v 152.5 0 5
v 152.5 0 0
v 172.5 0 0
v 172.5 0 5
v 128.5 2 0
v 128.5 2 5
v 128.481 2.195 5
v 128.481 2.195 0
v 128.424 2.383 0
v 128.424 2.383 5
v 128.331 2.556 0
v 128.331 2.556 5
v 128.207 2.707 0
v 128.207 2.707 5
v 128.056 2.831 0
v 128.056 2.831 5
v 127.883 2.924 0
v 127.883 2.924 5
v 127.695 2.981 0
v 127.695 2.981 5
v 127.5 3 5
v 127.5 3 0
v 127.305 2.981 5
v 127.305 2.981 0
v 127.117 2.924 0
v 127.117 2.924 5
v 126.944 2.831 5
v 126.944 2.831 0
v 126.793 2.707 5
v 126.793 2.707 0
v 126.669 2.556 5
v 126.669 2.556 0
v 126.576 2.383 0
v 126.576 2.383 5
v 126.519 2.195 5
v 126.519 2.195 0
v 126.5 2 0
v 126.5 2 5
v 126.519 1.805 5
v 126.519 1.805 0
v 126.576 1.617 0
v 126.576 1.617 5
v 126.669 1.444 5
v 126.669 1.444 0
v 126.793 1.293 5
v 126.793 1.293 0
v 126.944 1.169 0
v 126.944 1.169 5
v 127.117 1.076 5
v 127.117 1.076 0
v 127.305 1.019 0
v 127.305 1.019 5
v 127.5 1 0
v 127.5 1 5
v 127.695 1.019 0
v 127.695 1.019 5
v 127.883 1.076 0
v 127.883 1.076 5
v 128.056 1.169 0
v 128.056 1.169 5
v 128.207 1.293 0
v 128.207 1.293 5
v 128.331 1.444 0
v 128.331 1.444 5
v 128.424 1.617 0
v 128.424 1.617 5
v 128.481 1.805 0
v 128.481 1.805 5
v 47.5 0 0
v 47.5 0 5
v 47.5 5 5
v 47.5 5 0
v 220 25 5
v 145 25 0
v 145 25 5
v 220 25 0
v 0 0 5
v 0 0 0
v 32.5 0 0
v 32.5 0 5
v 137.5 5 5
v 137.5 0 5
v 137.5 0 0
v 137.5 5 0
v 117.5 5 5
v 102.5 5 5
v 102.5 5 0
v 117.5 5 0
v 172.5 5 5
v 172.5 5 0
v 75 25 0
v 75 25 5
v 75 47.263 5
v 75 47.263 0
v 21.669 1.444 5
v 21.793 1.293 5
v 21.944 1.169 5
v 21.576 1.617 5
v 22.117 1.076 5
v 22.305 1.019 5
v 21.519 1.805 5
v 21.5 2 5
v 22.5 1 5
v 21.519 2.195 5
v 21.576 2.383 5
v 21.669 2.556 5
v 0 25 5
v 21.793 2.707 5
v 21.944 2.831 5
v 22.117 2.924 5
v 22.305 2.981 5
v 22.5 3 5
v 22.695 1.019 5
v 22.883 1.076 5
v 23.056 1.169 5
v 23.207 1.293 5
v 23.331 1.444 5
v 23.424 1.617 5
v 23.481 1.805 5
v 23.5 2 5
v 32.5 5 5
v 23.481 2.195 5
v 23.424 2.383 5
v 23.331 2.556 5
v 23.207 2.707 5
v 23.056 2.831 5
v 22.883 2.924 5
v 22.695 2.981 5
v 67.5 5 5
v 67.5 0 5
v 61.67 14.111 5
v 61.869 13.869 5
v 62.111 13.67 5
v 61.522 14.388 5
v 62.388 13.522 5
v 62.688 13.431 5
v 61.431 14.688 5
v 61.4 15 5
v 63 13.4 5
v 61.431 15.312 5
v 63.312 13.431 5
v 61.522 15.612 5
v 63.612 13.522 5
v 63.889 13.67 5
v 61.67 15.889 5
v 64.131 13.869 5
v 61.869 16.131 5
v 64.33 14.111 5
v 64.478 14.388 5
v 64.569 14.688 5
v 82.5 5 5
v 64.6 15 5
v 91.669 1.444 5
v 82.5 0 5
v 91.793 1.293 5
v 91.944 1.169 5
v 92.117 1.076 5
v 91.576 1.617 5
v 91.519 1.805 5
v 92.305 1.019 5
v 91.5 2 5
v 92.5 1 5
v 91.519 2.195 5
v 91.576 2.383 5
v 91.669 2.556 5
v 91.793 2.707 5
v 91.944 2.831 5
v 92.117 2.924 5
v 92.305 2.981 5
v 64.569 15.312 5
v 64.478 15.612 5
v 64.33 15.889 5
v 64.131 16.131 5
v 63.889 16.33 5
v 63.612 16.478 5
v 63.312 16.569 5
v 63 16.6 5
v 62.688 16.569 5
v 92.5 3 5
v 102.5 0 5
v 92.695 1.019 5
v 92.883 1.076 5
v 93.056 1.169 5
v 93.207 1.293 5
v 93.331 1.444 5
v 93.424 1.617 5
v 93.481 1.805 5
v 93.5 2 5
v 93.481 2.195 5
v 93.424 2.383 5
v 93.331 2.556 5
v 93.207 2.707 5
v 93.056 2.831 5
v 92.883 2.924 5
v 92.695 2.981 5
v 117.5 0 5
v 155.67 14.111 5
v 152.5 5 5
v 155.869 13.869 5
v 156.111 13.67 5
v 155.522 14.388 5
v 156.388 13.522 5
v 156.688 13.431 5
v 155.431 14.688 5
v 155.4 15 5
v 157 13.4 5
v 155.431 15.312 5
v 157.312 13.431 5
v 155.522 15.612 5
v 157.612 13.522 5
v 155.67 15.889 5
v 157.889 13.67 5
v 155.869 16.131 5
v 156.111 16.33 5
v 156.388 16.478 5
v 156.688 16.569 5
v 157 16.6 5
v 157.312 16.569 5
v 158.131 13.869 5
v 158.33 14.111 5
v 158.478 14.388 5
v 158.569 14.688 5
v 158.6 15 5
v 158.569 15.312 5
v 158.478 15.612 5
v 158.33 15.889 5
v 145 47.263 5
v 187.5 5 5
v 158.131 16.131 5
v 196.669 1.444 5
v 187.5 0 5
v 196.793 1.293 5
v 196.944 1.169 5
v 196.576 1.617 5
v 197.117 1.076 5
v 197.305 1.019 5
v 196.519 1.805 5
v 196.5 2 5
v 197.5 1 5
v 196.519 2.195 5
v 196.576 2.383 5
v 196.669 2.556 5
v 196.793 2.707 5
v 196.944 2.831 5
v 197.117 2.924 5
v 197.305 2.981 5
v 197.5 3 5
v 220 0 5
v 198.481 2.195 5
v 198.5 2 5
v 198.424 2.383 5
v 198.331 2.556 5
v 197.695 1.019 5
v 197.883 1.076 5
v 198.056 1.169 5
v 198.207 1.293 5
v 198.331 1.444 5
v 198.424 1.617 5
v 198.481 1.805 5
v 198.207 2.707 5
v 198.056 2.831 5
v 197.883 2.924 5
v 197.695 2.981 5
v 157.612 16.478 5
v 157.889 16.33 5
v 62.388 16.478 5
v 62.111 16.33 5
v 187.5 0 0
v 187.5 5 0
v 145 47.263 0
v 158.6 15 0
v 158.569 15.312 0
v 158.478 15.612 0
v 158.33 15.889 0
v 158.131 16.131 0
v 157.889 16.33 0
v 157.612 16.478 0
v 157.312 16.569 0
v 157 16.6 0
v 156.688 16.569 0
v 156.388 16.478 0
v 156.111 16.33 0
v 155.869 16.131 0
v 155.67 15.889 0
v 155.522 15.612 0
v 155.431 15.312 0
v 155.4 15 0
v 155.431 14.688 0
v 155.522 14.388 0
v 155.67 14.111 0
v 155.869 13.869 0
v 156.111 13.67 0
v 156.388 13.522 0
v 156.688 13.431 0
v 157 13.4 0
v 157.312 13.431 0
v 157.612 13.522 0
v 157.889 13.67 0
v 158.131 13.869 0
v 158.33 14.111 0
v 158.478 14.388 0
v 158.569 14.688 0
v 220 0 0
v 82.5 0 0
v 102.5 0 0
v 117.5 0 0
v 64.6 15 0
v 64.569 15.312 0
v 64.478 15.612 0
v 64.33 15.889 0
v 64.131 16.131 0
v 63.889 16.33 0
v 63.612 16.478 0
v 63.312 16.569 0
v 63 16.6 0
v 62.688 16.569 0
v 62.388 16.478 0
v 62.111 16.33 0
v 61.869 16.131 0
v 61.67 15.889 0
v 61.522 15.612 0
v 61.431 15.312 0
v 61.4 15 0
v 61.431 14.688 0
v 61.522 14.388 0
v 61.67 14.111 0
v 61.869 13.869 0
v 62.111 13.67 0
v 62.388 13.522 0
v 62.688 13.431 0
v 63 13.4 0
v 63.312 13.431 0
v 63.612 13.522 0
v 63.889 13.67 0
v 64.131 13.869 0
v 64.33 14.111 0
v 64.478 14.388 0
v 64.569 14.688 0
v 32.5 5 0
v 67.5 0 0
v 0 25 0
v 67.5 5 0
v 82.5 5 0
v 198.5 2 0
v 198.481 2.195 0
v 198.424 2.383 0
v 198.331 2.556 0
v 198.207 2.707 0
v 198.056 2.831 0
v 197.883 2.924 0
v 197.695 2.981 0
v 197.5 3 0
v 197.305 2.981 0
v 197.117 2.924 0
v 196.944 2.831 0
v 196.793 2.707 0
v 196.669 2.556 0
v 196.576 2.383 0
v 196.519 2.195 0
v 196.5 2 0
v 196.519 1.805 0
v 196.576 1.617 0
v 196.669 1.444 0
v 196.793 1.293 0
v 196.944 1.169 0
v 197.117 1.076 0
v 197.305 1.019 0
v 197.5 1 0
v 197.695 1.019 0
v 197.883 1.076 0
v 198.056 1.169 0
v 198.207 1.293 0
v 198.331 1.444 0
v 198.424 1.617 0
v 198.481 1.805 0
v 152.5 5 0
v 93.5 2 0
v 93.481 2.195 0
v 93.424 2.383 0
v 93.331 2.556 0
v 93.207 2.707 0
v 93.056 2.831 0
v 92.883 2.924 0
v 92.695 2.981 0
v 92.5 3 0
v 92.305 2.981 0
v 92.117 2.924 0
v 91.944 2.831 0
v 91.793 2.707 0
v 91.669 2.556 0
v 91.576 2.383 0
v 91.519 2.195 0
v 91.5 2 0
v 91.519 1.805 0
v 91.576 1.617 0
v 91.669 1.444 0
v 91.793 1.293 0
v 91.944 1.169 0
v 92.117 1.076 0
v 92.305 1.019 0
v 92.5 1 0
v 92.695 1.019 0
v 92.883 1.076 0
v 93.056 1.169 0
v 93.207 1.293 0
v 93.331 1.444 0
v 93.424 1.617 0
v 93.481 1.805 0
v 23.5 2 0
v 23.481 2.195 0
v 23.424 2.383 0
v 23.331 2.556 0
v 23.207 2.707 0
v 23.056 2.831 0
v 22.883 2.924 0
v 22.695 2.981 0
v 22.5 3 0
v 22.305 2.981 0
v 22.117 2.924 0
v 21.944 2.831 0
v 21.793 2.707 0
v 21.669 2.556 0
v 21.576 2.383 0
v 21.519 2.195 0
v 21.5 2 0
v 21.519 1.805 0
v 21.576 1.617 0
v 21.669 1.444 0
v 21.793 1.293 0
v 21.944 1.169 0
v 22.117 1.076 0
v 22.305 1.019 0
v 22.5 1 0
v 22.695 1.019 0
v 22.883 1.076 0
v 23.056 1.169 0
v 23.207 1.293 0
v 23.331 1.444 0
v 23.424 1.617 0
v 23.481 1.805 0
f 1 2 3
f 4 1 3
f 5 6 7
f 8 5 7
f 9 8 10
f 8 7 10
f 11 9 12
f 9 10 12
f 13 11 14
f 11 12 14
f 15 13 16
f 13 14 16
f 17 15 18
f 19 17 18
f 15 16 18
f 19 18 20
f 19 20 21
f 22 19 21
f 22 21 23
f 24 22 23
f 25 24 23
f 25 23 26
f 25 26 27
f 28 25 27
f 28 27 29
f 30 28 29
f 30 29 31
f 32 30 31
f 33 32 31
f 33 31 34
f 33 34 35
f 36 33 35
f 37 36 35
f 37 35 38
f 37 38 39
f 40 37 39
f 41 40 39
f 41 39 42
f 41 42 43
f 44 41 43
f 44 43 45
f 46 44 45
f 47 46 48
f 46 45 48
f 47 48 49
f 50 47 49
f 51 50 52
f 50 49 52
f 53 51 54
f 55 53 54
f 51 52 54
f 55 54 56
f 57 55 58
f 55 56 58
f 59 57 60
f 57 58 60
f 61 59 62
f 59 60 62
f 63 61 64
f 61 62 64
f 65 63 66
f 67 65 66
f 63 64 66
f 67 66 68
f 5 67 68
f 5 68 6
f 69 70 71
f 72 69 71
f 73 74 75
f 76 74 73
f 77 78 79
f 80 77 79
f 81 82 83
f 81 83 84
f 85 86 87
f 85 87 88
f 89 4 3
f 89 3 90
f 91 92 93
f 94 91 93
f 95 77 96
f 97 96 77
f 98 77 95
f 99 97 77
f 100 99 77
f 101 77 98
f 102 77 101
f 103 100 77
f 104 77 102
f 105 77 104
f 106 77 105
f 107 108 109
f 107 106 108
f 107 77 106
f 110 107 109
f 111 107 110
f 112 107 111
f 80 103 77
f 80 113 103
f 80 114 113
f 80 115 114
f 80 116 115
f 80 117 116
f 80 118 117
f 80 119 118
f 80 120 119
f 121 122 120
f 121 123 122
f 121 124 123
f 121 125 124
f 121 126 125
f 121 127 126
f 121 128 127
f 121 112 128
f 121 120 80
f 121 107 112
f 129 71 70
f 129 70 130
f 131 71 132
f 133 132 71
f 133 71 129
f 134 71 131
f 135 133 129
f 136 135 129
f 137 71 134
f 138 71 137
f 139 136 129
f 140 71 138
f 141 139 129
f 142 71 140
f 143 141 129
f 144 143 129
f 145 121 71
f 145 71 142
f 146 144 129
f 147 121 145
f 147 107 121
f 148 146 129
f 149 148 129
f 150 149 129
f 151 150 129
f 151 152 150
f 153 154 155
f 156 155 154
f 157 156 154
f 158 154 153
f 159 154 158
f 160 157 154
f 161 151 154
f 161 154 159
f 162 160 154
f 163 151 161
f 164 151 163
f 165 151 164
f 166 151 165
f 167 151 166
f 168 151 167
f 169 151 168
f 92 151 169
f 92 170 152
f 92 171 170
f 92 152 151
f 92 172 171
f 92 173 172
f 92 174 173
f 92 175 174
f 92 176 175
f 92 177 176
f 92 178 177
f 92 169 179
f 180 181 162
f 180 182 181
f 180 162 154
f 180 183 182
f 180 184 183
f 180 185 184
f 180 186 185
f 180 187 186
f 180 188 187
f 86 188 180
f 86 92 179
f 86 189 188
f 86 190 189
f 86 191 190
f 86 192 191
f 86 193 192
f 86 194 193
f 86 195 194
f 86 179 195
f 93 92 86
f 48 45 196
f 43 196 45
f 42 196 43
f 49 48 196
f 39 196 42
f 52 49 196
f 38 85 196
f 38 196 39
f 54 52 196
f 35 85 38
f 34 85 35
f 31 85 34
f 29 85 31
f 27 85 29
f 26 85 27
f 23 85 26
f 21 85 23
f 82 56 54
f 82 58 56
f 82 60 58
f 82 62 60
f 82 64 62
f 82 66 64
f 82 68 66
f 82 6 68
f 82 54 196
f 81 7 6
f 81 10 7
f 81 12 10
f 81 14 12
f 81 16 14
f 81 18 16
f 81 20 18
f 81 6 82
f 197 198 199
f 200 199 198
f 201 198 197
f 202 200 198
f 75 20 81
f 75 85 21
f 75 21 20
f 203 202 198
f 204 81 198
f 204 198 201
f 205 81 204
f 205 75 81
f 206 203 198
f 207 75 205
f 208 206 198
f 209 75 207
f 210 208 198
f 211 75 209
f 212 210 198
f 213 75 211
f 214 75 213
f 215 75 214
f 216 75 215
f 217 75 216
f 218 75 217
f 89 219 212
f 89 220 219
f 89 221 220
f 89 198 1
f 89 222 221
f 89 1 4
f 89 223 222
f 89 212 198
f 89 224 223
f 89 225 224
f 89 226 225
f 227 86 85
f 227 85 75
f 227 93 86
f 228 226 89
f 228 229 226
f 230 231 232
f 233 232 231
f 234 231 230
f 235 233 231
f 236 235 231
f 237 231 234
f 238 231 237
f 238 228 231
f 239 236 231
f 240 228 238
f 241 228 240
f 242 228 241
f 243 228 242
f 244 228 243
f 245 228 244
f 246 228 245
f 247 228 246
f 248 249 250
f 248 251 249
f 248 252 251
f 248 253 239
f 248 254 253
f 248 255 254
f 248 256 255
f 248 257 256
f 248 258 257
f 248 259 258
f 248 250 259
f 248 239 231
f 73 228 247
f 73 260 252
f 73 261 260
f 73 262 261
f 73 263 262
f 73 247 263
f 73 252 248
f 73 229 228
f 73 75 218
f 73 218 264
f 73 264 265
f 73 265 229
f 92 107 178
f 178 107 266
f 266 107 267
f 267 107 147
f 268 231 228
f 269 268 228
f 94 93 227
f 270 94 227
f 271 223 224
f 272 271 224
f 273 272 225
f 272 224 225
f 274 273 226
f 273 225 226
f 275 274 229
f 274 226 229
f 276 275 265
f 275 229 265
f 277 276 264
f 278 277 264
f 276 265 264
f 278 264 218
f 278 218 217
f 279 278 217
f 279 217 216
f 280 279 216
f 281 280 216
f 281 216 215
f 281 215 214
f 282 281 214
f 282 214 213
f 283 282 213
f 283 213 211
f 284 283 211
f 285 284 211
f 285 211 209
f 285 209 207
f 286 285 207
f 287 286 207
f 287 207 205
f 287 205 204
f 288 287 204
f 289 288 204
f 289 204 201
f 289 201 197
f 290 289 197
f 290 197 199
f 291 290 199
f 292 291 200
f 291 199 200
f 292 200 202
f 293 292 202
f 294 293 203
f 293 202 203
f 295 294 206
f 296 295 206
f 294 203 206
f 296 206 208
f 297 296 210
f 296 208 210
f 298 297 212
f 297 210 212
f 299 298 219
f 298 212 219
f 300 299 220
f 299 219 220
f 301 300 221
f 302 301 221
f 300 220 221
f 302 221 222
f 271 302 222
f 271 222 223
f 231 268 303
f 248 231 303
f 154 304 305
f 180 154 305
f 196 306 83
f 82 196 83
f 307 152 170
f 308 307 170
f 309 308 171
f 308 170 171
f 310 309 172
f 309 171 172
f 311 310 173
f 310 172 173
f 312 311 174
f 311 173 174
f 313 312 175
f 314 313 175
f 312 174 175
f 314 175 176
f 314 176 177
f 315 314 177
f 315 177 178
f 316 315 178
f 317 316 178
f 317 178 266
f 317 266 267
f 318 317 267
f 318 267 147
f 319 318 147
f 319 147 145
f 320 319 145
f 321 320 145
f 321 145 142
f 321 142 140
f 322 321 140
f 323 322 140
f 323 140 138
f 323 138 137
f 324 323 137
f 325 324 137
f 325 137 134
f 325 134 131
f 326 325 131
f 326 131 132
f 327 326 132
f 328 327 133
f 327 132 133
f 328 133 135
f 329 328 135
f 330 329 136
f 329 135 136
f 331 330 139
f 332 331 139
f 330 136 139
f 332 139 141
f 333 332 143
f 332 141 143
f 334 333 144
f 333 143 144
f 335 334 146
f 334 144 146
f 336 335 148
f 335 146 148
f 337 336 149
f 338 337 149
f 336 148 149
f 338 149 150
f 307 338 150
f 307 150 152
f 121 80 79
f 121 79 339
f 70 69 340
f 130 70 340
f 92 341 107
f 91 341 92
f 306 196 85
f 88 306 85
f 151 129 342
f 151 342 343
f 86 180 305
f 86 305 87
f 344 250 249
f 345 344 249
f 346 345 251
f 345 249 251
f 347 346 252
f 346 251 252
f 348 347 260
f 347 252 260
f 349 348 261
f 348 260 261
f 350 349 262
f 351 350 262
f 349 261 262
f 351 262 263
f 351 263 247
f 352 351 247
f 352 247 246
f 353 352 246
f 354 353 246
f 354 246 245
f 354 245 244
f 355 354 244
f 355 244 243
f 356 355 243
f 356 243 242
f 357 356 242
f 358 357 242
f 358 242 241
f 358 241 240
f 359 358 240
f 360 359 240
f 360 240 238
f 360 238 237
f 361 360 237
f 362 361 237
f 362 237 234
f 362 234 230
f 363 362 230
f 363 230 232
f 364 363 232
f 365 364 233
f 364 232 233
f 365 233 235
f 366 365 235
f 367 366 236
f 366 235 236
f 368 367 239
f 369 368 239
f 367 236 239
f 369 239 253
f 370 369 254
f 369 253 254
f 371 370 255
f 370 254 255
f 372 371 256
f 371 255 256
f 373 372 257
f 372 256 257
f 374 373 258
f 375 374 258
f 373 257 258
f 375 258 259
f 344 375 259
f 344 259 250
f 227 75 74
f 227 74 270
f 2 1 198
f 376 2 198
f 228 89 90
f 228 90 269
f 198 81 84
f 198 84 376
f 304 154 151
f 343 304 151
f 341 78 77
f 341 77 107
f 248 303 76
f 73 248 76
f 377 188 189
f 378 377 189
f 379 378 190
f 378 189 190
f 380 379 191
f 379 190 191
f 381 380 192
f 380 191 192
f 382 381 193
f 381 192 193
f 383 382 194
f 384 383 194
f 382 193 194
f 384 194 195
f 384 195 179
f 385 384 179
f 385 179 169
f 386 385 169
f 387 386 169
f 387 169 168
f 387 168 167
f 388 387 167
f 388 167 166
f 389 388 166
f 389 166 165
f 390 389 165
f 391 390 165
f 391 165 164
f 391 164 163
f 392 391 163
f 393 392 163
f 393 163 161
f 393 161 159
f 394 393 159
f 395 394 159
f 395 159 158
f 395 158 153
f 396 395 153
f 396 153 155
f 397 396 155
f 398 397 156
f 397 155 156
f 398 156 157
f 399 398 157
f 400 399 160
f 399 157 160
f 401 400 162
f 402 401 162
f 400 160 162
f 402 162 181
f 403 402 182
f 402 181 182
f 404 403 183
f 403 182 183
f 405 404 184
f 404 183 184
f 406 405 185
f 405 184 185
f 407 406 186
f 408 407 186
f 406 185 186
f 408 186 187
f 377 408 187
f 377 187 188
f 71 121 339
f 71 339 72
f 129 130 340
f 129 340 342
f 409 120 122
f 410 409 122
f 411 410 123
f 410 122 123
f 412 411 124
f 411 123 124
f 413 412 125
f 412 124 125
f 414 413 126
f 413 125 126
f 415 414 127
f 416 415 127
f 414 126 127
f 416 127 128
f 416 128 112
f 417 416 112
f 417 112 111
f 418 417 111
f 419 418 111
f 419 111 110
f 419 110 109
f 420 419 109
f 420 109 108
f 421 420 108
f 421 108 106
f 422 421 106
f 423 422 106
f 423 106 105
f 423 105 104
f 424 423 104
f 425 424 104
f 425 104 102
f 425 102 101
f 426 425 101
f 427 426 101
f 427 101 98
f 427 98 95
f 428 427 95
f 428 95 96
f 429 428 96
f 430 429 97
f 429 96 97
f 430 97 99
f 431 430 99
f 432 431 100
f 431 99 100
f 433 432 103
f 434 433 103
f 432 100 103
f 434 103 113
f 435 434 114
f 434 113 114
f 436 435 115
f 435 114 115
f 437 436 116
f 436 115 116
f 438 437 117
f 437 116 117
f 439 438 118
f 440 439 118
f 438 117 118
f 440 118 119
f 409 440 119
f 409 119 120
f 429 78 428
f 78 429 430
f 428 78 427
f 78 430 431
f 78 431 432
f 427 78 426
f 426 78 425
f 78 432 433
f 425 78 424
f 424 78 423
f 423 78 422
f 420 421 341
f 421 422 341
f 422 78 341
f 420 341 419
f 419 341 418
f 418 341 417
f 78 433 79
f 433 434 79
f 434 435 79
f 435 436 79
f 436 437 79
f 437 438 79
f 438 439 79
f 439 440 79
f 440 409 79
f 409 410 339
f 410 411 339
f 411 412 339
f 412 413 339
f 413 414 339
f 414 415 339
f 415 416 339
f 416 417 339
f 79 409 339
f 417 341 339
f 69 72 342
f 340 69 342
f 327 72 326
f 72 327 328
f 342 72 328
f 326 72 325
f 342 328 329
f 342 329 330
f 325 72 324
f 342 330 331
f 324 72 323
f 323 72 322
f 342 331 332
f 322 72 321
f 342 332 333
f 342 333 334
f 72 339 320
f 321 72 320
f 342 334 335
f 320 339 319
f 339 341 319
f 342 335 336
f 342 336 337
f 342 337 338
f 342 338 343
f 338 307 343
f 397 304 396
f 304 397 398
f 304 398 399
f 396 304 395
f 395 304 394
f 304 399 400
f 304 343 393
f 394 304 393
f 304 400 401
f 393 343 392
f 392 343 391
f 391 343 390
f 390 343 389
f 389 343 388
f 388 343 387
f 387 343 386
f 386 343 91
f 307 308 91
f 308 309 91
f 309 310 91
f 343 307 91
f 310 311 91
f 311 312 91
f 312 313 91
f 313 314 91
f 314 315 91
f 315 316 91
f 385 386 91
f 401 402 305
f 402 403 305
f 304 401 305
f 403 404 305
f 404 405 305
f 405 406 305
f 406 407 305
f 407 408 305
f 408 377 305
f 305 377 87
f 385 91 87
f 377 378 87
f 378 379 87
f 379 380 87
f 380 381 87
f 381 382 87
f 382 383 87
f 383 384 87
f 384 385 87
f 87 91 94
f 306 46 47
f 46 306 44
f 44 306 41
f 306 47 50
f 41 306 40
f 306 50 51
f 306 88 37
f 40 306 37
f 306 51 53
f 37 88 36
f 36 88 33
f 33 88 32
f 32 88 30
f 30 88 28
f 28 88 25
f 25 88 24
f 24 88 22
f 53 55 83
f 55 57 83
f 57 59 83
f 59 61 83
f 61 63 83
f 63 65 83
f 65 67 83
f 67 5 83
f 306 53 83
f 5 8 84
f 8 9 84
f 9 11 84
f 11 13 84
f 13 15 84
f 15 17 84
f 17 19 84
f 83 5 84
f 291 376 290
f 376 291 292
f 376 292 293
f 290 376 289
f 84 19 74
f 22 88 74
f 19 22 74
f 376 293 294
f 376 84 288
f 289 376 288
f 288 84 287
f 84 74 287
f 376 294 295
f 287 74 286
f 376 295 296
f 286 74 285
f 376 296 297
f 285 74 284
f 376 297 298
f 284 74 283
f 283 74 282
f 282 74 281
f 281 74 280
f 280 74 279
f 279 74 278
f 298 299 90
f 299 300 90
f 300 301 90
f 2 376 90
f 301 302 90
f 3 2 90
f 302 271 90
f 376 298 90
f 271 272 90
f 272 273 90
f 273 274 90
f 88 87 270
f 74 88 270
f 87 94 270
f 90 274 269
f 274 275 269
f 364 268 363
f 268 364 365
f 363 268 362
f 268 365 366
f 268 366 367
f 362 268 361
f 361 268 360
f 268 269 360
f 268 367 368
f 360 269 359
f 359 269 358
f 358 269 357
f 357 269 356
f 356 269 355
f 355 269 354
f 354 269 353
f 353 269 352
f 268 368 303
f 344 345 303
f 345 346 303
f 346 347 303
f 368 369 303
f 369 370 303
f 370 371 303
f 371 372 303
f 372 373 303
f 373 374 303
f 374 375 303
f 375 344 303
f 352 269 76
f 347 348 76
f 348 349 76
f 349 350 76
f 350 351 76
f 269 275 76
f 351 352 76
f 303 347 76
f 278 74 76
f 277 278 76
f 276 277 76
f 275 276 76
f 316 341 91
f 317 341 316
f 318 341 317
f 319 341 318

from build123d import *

# Parameters (mm, degrees)
SKETCH_1_W          = 220
SKETCH_1_H          = 25
EXTRUDE_1_DEPTH     = 5
SKETCH_2_W          = 70
SKETCH_2_H          = 22.26349322
EXTRUDE_2_DEPTH     = 5
SKETCH_3_W          = 15
SKETCH_3_H          = 5
CUT_EXTRUDE_1_DEPTH = 226.075182531
SKETCH_4_R          = 1.6
CUT_EXTRUDE_2_DEPTH = 226.075182531
SKETCH_7_R          = 1
CUT_EXTRUDE_4_DEPTH = 226.075182531


with BuildPart() as part:
    # 草图1 → 凸台-拉伸1 (new body)
    with BuildSketch(Plane.XY):
        with Locations((110, 12.5)):
            Rectangle(SKETCH_1_W, SKETCH_1_H)
    extrude(amount=EXTRUDE_1_DEPTH)

    # 草图2 → 凸台-拉伸2 (add)
    with BuildSketch(Plane.XY.offset(5)):
        with Locations((110, 36.13174661)):
            Rectangle(SKETCH_2_W, SKETCH_2_H)
    extrude(amount=-EXTRUDE_2_DEPTH)

    # 草图3 → 切除-拉伸1 (cut, through all)
    with BuildSketch(Plane.XY.offset(5)):
        with Locations((110, 2.5)):
            Rectangle(SKETCH_3_W, SKETCH_3_H)
        with Locations((145, 2.5)):
            Rectangle(SKETCH_3_W, SKETCH_3_H)
        with Locations((180, 2.5)):
            Rectangle(SKETCH_3_W, SKETCH_3_H)
        with Locations((75, 2.5)):
            Rectangle(SKETCH_3_W, SKETCH_3_H)
        with Locations((40, 2.5)):
            Rectangle(SKETCH_3_W, SKETCH_3_H)
    extrude(amount=-CUT_EXTRUDE_1_DEPTH, mode=Mode.SUBTRACT)

    # 草图4 → 切除-拉伸2 (cut, through all)
    with BuildSketch(Plane.XY.offset(5)):
        with Locations((63, 15)):
            Circle(SKETCH_4_R)
        with Locations((157, 15)):
            Circle(SKETCH_4_R)
    extrude(amount=-CUT_EXTRUDE_2_DEPTH, mode=Mode.SUBTRACT)

    # 草图7 → 切除-拉伸4 (cut, through all)
    with BuildSketch(Plane.XY.offset(5)):
        with Locations((22.5, 2)):
            Circle(SKETCH_7_R)
        with Locations((92.5, 2)):
            Circle(SKETCH_7_R)
        with Locations((127.5, 2)):
            Circle(SKETCH_7_R)
        with Locations((197.5, 2)):
            Circle(SKETCH_7_R)
    extrude(amount=-CUT_EXTRUDE_4_DEPTH, mode=Mode.SUBTRACT)


solid = part.part
